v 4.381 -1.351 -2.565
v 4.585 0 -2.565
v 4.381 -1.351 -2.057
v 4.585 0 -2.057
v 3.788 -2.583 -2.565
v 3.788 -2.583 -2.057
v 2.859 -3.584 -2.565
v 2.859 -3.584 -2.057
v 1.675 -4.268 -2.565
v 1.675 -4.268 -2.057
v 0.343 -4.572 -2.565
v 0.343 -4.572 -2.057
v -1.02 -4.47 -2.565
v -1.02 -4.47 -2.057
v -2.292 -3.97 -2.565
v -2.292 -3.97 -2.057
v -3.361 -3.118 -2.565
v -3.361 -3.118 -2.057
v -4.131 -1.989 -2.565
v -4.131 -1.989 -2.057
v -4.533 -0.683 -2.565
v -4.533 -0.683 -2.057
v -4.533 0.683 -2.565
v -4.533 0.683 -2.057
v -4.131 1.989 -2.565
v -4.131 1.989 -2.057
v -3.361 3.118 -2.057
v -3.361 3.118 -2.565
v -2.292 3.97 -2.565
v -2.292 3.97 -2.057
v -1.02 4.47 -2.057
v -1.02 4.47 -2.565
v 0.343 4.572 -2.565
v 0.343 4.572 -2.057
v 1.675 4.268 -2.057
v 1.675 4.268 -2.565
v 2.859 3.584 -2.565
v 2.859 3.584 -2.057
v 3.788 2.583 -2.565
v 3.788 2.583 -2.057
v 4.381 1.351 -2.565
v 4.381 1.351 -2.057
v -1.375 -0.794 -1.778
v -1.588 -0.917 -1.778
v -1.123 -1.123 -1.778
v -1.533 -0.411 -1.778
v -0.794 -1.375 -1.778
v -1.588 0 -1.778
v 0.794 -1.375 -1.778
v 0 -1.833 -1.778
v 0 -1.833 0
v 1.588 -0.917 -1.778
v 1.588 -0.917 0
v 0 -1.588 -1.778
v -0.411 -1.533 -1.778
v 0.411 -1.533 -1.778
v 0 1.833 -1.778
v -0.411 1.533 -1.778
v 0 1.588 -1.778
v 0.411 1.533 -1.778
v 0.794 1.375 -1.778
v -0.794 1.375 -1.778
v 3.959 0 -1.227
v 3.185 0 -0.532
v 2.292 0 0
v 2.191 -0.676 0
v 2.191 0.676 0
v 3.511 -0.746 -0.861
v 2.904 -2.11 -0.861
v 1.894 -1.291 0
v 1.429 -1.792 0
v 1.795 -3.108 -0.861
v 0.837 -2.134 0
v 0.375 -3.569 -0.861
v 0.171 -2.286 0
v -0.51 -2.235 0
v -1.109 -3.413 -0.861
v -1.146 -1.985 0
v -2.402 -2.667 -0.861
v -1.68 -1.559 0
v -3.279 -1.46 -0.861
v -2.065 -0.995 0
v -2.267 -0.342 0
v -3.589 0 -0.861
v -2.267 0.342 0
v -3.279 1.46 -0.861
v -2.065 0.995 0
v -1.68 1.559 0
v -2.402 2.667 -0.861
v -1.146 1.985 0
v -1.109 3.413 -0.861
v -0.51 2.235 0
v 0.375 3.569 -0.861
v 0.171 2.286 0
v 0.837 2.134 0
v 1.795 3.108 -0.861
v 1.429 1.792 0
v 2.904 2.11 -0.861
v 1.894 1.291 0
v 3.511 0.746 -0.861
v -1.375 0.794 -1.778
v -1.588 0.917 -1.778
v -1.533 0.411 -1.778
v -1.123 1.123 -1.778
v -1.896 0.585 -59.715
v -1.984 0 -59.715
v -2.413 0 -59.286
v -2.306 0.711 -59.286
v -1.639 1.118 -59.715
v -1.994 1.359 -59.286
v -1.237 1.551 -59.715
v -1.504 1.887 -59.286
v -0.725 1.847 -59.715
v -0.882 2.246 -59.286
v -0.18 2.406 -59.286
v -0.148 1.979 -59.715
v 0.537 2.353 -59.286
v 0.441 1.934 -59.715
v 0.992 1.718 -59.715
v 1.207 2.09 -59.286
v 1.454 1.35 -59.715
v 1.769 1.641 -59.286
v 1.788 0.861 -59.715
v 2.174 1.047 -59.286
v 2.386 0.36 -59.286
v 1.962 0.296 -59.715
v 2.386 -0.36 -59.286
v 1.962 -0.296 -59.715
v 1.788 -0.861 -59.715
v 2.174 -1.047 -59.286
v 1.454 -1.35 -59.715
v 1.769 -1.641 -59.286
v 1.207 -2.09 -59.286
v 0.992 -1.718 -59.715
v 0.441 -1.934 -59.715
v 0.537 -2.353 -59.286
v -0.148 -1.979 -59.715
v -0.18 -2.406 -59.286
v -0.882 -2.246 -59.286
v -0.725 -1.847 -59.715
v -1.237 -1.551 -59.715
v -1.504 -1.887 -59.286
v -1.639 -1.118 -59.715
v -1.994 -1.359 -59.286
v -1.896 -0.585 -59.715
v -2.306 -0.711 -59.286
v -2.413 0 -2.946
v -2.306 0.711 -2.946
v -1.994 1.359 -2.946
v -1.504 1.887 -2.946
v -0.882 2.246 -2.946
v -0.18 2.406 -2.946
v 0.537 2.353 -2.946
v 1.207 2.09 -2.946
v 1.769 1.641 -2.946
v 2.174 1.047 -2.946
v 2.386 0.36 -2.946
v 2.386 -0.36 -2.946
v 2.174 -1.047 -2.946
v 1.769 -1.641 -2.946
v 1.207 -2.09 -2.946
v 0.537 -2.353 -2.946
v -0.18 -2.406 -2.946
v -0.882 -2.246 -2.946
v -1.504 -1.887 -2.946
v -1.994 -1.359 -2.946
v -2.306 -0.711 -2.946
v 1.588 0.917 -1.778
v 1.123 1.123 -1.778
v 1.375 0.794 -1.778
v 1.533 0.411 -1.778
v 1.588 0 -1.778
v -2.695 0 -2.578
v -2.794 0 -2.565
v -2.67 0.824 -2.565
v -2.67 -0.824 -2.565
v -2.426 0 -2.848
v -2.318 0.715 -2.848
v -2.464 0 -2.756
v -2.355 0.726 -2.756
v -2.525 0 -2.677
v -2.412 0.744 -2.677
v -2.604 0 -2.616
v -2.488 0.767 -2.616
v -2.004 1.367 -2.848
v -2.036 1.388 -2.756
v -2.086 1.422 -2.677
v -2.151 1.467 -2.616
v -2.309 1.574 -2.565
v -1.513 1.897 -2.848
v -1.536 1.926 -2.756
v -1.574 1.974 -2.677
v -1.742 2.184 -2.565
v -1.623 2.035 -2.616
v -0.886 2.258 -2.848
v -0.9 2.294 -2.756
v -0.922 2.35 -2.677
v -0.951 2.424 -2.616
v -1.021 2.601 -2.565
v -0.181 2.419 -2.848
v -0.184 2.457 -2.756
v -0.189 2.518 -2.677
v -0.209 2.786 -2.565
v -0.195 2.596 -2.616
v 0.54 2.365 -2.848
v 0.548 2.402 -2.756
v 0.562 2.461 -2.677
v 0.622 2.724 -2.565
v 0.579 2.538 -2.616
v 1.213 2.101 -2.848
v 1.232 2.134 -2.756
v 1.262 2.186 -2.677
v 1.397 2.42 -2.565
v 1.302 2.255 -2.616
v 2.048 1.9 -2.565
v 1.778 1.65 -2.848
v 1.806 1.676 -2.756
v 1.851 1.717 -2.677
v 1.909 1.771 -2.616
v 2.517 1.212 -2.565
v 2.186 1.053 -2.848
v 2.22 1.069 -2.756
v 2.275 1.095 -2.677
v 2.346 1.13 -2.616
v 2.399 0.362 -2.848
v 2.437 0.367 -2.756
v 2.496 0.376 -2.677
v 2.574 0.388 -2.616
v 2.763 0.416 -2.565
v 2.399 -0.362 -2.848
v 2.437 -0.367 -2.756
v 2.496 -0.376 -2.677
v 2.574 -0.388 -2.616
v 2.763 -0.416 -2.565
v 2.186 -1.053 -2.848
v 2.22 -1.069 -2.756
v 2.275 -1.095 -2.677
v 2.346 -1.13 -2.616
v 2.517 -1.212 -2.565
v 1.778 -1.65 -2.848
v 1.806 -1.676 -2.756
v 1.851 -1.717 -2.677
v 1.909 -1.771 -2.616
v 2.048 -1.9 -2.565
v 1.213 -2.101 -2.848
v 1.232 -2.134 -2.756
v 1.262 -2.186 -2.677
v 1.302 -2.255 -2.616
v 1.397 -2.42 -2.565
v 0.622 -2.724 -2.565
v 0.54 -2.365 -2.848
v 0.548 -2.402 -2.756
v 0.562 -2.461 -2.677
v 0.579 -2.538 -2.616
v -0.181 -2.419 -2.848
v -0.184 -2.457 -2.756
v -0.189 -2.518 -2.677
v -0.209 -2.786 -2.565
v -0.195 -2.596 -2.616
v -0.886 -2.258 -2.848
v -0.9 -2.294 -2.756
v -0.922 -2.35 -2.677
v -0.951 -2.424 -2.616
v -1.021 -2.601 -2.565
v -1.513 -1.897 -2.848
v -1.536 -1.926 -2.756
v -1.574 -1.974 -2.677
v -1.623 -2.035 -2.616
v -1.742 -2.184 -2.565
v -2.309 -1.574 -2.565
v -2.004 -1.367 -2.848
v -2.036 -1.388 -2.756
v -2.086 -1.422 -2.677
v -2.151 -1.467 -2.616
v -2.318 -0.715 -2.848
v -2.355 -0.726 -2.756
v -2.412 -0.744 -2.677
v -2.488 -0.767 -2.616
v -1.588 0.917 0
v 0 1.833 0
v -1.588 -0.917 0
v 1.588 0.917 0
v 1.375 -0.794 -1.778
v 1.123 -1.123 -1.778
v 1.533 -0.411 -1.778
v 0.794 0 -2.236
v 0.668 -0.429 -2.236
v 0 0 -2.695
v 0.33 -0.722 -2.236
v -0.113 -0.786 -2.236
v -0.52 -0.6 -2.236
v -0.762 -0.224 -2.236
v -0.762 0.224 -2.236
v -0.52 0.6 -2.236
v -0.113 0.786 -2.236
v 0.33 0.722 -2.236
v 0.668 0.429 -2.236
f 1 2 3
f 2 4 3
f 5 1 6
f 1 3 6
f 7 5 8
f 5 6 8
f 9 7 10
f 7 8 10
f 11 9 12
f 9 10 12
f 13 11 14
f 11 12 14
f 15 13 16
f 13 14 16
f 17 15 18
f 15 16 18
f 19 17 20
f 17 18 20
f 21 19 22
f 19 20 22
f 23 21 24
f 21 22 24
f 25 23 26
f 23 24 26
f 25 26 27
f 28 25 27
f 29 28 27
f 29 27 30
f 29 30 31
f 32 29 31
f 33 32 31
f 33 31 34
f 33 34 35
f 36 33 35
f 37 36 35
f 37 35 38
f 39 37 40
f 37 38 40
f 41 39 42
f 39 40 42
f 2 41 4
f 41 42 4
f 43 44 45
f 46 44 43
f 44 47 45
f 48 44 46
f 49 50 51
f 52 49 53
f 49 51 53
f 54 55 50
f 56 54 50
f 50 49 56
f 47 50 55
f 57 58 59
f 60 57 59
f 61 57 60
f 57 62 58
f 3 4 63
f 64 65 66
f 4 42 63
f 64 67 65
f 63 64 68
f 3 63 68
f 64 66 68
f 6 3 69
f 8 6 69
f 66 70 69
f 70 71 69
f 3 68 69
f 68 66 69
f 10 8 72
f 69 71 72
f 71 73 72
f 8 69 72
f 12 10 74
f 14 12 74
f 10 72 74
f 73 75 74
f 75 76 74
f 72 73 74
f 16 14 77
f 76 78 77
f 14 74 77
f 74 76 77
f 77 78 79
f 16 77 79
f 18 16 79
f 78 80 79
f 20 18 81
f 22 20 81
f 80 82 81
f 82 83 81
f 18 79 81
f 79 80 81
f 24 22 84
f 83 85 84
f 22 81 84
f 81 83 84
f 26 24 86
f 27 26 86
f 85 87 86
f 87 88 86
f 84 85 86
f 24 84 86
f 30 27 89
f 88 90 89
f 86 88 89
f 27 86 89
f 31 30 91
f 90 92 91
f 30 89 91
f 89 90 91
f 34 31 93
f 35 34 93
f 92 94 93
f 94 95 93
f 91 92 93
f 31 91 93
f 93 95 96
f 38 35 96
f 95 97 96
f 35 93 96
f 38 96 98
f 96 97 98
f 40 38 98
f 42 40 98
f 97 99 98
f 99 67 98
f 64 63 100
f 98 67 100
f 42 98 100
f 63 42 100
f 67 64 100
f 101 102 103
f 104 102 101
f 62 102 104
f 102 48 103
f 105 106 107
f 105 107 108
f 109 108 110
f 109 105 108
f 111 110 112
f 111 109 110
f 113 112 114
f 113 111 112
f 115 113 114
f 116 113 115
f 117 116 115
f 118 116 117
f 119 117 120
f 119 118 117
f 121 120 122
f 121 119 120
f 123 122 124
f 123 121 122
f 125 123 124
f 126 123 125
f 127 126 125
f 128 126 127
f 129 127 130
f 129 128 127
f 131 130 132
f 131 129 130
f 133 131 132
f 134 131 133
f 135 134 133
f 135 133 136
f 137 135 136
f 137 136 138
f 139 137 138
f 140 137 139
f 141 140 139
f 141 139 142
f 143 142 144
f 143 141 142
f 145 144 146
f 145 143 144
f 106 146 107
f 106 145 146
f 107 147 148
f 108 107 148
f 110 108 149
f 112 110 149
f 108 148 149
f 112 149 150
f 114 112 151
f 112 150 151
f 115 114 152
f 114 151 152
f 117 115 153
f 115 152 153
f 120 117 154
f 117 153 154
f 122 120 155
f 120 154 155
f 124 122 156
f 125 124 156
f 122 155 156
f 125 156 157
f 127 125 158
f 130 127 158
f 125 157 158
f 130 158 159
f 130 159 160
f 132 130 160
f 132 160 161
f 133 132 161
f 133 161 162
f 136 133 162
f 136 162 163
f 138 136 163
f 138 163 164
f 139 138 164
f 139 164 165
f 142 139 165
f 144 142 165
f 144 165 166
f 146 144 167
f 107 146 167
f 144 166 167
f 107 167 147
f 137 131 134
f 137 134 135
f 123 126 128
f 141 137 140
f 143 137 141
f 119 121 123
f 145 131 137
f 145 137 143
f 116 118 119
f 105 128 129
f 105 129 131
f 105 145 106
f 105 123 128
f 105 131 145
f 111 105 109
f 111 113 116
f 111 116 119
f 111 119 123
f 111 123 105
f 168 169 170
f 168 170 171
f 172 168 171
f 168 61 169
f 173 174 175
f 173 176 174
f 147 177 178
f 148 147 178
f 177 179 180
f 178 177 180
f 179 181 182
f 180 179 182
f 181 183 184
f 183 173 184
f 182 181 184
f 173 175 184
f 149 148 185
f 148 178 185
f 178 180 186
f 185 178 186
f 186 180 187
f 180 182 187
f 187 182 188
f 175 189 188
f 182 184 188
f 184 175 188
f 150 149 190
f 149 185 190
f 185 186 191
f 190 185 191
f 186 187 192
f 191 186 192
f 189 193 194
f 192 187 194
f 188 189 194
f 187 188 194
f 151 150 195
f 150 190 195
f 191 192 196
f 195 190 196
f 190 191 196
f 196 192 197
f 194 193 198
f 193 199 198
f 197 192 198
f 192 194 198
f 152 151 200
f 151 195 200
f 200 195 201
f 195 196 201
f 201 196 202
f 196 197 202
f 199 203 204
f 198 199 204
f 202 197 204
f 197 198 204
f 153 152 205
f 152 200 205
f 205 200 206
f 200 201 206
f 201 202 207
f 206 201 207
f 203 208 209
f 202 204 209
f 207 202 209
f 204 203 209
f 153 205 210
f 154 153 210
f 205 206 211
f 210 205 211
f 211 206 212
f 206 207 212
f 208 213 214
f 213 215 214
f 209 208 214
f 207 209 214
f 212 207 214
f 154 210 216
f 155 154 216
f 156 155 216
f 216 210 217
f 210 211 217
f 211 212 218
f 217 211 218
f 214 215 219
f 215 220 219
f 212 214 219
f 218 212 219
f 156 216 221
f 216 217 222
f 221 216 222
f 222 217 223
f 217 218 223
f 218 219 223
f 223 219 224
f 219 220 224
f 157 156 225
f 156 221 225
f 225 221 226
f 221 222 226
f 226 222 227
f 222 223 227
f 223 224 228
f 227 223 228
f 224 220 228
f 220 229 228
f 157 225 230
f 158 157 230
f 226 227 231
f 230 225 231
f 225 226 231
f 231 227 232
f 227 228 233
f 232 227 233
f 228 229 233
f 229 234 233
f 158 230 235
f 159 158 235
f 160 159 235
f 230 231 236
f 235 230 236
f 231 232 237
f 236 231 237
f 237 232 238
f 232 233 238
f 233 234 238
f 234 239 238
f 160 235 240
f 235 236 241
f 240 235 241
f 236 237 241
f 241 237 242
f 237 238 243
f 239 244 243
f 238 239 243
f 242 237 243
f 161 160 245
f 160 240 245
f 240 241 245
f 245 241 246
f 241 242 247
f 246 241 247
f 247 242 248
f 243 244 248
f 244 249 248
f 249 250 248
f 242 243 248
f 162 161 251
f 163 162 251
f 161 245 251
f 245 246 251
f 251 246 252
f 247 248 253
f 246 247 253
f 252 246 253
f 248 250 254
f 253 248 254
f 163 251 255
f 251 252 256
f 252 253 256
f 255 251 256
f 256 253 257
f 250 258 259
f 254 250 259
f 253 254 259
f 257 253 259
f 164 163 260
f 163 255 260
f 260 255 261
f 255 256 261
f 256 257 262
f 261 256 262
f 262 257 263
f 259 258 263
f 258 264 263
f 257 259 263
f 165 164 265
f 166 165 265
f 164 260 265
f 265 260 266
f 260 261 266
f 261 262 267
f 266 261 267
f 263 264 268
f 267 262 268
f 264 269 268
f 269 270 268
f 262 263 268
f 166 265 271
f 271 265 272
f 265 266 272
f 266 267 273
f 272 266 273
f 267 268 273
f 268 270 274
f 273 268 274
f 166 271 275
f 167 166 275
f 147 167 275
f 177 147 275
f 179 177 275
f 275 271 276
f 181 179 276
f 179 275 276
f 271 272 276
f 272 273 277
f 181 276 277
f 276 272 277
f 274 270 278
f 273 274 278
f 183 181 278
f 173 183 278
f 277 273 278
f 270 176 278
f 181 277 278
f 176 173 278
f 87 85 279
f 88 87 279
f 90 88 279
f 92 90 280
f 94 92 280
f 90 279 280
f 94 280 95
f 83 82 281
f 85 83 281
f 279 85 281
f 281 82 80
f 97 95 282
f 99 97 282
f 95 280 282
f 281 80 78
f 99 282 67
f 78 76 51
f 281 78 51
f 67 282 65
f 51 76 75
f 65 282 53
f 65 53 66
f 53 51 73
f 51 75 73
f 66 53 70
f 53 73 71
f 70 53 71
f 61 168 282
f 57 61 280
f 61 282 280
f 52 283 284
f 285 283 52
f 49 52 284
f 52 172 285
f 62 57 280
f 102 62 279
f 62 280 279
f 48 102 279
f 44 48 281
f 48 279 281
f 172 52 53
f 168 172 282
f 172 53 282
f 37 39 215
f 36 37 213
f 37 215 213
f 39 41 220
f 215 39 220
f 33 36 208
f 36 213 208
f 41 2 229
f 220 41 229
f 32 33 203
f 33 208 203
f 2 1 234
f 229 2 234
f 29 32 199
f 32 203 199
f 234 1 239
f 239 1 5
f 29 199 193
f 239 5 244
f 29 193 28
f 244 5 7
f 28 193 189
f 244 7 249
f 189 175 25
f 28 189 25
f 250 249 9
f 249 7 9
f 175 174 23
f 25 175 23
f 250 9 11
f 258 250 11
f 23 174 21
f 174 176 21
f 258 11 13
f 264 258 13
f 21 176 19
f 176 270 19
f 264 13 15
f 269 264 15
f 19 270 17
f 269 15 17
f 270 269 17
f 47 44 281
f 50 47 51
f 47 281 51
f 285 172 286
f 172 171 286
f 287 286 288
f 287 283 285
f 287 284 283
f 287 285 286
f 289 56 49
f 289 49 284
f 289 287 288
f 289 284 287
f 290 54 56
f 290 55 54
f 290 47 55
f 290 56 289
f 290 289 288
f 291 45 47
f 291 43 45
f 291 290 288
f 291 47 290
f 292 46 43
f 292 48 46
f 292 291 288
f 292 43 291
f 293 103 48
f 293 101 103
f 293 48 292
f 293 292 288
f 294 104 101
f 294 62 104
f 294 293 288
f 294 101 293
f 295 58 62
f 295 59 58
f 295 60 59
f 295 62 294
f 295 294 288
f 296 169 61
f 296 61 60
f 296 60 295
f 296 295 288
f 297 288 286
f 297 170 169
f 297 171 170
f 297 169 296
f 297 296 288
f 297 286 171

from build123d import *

# Parameters (mm, degrees)
SKETCH2_R           = 2.413
BOSS_EXTRUDE1_DEPTH = 57.15
CUT_EXTRUDE1_DEPTH  = 1.778
CHAMFER1_SIZE       = 0.428942381
FILLET1_R           = 0.381


with BuildPart() as part:
    # Sketch1 → Revolve1 (revolve)
    with BuildSketch(Plane.XZ):
        with BuildLine():
            Line((2.29235, 0), (0, 0))
            Line((0, 0), (0, -2.5654))
            Line((0, -2.5654), (4.5847, -2.5654))
            Line((4.5847, -2.5654), (4.5847, -2.0574))
            ThreePointArc((4.5847, -2.0574), (3.589105441, -0.860923645), (2.29235, 0))
        make_face()
    revolve(axis=Axis((0, 0, 0), (0, 0, -1)))

    # Sketch2 → Boss-Extrude1 (add)
    with BuildSketch(Plane(origin=(0, 0, -2.5654), x_dir=(-1, 0, 0), z_dir=(0, 0, -1))):
        Circle(SKETCH2_R)
    extrude(amount=BOSS_EXTRUDE1_DEPTH)

    # Sketch3 → Cut-Extrude1 (cut)
    with BuildSketch(Plane.XY):
        Polygon((1.5875, -0.916543552), (1.5875, 0.916543552), (0, 1.833087105), (-1.5875, 0.916543552), (-1.5875, -0.916543552), (0, -1.833087105), align=None)
    extrude(amount=-CUT_EXTRUDE1_DEPTH, mode=Mode.SUBTRACT)

    # Sketch4 → Cut-Revolve1 (revolve, cut)
    with BuildSketch(Plane.XZ):
        Polygon((1.5875, -1.778), (0, -1.778), (0, -2.694543552), align=None)
    revolve(axis=Axis((0, 0, -1.778), (0, 0, -1)), mode=Mode.SUBTRACT)

    # Chamfer1
    chamfer1_edges = [part.edges().sort_by_distance(p)[0] for p in [
        (2.413, 0, -59.7154),
    ]]
    chamfer(chamfer1_edges, length=CHAMFER1_SIZE)

    # Fillet1
    fillet1_edges = [part.edges().sort_by_distance(p)[0] for p in [
        (2.413, 0, -2.5654),
    ]]
    fillet(fillet1_edges, radius=FILLET1_R)


solid = part.part
